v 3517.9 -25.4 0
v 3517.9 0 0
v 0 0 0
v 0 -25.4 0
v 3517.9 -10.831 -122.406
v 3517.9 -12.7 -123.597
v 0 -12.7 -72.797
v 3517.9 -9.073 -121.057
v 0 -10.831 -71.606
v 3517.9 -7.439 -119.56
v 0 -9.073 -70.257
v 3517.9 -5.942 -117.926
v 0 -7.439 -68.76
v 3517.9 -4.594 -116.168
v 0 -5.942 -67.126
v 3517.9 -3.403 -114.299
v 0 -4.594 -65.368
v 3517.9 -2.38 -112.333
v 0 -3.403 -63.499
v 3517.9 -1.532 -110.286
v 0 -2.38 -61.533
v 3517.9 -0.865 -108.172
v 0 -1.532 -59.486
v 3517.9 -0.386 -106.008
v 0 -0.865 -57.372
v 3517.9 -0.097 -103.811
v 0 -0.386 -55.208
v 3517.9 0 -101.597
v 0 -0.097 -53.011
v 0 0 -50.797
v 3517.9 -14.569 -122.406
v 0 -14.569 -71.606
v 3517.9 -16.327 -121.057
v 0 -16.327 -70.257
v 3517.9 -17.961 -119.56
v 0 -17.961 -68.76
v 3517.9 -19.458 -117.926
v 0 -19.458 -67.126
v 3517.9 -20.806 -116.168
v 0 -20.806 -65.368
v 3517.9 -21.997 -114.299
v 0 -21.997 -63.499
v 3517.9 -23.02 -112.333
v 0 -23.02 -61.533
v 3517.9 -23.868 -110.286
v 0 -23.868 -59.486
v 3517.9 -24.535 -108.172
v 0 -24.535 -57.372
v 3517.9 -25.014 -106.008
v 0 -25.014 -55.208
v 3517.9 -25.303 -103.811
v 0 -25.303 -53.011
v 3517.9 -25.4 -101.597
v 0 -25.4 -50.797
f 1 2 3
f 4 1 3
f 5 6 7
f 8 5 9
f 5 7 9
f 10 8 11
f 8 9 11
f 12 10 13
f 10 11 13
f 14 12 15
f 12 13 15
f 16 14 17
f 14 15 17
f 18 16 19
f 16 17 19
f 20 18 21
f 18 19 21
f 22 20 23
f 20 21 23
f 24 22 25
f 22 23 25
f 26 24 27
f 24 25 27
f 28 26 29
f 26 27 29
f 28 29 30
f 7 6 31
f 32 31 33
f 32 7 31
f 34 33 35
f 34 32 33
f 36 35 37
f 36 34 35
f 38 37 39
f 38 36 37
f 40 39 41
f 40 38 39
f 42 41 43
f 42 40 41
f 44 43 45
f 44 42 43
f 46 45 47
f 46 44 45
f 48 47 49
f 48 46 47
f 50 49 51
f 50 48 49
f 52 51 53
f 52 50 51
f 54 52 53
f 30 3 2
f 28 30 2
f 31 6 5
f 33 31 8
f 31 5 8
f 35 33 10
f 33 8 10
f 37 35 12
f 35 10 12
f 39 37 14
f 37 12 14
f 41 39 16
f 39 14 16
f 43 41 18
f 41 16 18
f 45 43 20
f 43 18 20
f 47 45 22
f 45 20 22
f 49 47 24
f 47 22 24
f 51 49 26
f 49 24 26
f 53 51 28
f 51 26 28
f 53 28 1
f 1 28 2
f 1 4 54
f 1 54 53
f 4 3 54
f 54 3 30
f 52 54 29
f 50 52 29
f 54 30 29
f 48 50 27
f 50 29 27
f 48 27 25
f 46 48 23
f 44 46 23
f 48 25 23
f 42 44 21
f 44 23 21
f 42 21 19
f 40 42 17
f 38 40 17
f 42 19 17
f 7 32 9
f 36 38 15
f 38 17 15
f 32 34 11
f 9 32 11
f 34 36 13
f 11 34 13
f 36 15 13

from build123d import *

# Parameters (mm, degrees)
F1_DEPTH    = 25.4
F2_T1_DEPTH = 3645.2667678844


# Not quite as in the source:
# - a fillet or chamfer that OpenCascade refuses, or shapes differently, is made with other operations: its cross-section is extruded or revolved along the edge and cut away or added


with BuildPart() as f1:
    # F0 (on Front) → F1 (new body)
    with BuildSketch(Plane.XZ):
        Polygon((3517.9, 0), (0, 0), (0, -76.2), (3517.9, -127), align=None)
    extrude(amount=F1_DEPTH)

    # F2: fillet of radius 25.4 on 2 edges, made by hand

    # F2_s2 → F2_t1 (cut)
    with BuildSketch(Plane(origin=(-62.3932487266, 0, 0.9009855412), x_dir=(0, 1, 0), z_dir=(0.9998957532, 0, -0.0144389278))):
        with BuildLine():
            ThreePointArc((0, -76.1920563975), (-17.9605122421, -68.7525686396), (-25.4, -50.7920563975))
            Line((-25.4, -50.7920563975), (-25.4, -76.1920563975))
            Line((-25.4, -76.1920563975), (0, -76.1920563975))
        make_face()
        with BuildLine():
            ThreePointArc((-25.4, -76.1920563975), (-7.4394877579, -68.7525686396), (0, -50.7920563975))
            Line((0, -50.7920563975), (0, -76.1920563975))
            Line((0, -76.1920563975), (-25.4, -76.1920563975))
        make_face()
    extrude(amount=F2_T1_DEPTH, mode=Mode.SUBTRACT)


solid = f1.part
